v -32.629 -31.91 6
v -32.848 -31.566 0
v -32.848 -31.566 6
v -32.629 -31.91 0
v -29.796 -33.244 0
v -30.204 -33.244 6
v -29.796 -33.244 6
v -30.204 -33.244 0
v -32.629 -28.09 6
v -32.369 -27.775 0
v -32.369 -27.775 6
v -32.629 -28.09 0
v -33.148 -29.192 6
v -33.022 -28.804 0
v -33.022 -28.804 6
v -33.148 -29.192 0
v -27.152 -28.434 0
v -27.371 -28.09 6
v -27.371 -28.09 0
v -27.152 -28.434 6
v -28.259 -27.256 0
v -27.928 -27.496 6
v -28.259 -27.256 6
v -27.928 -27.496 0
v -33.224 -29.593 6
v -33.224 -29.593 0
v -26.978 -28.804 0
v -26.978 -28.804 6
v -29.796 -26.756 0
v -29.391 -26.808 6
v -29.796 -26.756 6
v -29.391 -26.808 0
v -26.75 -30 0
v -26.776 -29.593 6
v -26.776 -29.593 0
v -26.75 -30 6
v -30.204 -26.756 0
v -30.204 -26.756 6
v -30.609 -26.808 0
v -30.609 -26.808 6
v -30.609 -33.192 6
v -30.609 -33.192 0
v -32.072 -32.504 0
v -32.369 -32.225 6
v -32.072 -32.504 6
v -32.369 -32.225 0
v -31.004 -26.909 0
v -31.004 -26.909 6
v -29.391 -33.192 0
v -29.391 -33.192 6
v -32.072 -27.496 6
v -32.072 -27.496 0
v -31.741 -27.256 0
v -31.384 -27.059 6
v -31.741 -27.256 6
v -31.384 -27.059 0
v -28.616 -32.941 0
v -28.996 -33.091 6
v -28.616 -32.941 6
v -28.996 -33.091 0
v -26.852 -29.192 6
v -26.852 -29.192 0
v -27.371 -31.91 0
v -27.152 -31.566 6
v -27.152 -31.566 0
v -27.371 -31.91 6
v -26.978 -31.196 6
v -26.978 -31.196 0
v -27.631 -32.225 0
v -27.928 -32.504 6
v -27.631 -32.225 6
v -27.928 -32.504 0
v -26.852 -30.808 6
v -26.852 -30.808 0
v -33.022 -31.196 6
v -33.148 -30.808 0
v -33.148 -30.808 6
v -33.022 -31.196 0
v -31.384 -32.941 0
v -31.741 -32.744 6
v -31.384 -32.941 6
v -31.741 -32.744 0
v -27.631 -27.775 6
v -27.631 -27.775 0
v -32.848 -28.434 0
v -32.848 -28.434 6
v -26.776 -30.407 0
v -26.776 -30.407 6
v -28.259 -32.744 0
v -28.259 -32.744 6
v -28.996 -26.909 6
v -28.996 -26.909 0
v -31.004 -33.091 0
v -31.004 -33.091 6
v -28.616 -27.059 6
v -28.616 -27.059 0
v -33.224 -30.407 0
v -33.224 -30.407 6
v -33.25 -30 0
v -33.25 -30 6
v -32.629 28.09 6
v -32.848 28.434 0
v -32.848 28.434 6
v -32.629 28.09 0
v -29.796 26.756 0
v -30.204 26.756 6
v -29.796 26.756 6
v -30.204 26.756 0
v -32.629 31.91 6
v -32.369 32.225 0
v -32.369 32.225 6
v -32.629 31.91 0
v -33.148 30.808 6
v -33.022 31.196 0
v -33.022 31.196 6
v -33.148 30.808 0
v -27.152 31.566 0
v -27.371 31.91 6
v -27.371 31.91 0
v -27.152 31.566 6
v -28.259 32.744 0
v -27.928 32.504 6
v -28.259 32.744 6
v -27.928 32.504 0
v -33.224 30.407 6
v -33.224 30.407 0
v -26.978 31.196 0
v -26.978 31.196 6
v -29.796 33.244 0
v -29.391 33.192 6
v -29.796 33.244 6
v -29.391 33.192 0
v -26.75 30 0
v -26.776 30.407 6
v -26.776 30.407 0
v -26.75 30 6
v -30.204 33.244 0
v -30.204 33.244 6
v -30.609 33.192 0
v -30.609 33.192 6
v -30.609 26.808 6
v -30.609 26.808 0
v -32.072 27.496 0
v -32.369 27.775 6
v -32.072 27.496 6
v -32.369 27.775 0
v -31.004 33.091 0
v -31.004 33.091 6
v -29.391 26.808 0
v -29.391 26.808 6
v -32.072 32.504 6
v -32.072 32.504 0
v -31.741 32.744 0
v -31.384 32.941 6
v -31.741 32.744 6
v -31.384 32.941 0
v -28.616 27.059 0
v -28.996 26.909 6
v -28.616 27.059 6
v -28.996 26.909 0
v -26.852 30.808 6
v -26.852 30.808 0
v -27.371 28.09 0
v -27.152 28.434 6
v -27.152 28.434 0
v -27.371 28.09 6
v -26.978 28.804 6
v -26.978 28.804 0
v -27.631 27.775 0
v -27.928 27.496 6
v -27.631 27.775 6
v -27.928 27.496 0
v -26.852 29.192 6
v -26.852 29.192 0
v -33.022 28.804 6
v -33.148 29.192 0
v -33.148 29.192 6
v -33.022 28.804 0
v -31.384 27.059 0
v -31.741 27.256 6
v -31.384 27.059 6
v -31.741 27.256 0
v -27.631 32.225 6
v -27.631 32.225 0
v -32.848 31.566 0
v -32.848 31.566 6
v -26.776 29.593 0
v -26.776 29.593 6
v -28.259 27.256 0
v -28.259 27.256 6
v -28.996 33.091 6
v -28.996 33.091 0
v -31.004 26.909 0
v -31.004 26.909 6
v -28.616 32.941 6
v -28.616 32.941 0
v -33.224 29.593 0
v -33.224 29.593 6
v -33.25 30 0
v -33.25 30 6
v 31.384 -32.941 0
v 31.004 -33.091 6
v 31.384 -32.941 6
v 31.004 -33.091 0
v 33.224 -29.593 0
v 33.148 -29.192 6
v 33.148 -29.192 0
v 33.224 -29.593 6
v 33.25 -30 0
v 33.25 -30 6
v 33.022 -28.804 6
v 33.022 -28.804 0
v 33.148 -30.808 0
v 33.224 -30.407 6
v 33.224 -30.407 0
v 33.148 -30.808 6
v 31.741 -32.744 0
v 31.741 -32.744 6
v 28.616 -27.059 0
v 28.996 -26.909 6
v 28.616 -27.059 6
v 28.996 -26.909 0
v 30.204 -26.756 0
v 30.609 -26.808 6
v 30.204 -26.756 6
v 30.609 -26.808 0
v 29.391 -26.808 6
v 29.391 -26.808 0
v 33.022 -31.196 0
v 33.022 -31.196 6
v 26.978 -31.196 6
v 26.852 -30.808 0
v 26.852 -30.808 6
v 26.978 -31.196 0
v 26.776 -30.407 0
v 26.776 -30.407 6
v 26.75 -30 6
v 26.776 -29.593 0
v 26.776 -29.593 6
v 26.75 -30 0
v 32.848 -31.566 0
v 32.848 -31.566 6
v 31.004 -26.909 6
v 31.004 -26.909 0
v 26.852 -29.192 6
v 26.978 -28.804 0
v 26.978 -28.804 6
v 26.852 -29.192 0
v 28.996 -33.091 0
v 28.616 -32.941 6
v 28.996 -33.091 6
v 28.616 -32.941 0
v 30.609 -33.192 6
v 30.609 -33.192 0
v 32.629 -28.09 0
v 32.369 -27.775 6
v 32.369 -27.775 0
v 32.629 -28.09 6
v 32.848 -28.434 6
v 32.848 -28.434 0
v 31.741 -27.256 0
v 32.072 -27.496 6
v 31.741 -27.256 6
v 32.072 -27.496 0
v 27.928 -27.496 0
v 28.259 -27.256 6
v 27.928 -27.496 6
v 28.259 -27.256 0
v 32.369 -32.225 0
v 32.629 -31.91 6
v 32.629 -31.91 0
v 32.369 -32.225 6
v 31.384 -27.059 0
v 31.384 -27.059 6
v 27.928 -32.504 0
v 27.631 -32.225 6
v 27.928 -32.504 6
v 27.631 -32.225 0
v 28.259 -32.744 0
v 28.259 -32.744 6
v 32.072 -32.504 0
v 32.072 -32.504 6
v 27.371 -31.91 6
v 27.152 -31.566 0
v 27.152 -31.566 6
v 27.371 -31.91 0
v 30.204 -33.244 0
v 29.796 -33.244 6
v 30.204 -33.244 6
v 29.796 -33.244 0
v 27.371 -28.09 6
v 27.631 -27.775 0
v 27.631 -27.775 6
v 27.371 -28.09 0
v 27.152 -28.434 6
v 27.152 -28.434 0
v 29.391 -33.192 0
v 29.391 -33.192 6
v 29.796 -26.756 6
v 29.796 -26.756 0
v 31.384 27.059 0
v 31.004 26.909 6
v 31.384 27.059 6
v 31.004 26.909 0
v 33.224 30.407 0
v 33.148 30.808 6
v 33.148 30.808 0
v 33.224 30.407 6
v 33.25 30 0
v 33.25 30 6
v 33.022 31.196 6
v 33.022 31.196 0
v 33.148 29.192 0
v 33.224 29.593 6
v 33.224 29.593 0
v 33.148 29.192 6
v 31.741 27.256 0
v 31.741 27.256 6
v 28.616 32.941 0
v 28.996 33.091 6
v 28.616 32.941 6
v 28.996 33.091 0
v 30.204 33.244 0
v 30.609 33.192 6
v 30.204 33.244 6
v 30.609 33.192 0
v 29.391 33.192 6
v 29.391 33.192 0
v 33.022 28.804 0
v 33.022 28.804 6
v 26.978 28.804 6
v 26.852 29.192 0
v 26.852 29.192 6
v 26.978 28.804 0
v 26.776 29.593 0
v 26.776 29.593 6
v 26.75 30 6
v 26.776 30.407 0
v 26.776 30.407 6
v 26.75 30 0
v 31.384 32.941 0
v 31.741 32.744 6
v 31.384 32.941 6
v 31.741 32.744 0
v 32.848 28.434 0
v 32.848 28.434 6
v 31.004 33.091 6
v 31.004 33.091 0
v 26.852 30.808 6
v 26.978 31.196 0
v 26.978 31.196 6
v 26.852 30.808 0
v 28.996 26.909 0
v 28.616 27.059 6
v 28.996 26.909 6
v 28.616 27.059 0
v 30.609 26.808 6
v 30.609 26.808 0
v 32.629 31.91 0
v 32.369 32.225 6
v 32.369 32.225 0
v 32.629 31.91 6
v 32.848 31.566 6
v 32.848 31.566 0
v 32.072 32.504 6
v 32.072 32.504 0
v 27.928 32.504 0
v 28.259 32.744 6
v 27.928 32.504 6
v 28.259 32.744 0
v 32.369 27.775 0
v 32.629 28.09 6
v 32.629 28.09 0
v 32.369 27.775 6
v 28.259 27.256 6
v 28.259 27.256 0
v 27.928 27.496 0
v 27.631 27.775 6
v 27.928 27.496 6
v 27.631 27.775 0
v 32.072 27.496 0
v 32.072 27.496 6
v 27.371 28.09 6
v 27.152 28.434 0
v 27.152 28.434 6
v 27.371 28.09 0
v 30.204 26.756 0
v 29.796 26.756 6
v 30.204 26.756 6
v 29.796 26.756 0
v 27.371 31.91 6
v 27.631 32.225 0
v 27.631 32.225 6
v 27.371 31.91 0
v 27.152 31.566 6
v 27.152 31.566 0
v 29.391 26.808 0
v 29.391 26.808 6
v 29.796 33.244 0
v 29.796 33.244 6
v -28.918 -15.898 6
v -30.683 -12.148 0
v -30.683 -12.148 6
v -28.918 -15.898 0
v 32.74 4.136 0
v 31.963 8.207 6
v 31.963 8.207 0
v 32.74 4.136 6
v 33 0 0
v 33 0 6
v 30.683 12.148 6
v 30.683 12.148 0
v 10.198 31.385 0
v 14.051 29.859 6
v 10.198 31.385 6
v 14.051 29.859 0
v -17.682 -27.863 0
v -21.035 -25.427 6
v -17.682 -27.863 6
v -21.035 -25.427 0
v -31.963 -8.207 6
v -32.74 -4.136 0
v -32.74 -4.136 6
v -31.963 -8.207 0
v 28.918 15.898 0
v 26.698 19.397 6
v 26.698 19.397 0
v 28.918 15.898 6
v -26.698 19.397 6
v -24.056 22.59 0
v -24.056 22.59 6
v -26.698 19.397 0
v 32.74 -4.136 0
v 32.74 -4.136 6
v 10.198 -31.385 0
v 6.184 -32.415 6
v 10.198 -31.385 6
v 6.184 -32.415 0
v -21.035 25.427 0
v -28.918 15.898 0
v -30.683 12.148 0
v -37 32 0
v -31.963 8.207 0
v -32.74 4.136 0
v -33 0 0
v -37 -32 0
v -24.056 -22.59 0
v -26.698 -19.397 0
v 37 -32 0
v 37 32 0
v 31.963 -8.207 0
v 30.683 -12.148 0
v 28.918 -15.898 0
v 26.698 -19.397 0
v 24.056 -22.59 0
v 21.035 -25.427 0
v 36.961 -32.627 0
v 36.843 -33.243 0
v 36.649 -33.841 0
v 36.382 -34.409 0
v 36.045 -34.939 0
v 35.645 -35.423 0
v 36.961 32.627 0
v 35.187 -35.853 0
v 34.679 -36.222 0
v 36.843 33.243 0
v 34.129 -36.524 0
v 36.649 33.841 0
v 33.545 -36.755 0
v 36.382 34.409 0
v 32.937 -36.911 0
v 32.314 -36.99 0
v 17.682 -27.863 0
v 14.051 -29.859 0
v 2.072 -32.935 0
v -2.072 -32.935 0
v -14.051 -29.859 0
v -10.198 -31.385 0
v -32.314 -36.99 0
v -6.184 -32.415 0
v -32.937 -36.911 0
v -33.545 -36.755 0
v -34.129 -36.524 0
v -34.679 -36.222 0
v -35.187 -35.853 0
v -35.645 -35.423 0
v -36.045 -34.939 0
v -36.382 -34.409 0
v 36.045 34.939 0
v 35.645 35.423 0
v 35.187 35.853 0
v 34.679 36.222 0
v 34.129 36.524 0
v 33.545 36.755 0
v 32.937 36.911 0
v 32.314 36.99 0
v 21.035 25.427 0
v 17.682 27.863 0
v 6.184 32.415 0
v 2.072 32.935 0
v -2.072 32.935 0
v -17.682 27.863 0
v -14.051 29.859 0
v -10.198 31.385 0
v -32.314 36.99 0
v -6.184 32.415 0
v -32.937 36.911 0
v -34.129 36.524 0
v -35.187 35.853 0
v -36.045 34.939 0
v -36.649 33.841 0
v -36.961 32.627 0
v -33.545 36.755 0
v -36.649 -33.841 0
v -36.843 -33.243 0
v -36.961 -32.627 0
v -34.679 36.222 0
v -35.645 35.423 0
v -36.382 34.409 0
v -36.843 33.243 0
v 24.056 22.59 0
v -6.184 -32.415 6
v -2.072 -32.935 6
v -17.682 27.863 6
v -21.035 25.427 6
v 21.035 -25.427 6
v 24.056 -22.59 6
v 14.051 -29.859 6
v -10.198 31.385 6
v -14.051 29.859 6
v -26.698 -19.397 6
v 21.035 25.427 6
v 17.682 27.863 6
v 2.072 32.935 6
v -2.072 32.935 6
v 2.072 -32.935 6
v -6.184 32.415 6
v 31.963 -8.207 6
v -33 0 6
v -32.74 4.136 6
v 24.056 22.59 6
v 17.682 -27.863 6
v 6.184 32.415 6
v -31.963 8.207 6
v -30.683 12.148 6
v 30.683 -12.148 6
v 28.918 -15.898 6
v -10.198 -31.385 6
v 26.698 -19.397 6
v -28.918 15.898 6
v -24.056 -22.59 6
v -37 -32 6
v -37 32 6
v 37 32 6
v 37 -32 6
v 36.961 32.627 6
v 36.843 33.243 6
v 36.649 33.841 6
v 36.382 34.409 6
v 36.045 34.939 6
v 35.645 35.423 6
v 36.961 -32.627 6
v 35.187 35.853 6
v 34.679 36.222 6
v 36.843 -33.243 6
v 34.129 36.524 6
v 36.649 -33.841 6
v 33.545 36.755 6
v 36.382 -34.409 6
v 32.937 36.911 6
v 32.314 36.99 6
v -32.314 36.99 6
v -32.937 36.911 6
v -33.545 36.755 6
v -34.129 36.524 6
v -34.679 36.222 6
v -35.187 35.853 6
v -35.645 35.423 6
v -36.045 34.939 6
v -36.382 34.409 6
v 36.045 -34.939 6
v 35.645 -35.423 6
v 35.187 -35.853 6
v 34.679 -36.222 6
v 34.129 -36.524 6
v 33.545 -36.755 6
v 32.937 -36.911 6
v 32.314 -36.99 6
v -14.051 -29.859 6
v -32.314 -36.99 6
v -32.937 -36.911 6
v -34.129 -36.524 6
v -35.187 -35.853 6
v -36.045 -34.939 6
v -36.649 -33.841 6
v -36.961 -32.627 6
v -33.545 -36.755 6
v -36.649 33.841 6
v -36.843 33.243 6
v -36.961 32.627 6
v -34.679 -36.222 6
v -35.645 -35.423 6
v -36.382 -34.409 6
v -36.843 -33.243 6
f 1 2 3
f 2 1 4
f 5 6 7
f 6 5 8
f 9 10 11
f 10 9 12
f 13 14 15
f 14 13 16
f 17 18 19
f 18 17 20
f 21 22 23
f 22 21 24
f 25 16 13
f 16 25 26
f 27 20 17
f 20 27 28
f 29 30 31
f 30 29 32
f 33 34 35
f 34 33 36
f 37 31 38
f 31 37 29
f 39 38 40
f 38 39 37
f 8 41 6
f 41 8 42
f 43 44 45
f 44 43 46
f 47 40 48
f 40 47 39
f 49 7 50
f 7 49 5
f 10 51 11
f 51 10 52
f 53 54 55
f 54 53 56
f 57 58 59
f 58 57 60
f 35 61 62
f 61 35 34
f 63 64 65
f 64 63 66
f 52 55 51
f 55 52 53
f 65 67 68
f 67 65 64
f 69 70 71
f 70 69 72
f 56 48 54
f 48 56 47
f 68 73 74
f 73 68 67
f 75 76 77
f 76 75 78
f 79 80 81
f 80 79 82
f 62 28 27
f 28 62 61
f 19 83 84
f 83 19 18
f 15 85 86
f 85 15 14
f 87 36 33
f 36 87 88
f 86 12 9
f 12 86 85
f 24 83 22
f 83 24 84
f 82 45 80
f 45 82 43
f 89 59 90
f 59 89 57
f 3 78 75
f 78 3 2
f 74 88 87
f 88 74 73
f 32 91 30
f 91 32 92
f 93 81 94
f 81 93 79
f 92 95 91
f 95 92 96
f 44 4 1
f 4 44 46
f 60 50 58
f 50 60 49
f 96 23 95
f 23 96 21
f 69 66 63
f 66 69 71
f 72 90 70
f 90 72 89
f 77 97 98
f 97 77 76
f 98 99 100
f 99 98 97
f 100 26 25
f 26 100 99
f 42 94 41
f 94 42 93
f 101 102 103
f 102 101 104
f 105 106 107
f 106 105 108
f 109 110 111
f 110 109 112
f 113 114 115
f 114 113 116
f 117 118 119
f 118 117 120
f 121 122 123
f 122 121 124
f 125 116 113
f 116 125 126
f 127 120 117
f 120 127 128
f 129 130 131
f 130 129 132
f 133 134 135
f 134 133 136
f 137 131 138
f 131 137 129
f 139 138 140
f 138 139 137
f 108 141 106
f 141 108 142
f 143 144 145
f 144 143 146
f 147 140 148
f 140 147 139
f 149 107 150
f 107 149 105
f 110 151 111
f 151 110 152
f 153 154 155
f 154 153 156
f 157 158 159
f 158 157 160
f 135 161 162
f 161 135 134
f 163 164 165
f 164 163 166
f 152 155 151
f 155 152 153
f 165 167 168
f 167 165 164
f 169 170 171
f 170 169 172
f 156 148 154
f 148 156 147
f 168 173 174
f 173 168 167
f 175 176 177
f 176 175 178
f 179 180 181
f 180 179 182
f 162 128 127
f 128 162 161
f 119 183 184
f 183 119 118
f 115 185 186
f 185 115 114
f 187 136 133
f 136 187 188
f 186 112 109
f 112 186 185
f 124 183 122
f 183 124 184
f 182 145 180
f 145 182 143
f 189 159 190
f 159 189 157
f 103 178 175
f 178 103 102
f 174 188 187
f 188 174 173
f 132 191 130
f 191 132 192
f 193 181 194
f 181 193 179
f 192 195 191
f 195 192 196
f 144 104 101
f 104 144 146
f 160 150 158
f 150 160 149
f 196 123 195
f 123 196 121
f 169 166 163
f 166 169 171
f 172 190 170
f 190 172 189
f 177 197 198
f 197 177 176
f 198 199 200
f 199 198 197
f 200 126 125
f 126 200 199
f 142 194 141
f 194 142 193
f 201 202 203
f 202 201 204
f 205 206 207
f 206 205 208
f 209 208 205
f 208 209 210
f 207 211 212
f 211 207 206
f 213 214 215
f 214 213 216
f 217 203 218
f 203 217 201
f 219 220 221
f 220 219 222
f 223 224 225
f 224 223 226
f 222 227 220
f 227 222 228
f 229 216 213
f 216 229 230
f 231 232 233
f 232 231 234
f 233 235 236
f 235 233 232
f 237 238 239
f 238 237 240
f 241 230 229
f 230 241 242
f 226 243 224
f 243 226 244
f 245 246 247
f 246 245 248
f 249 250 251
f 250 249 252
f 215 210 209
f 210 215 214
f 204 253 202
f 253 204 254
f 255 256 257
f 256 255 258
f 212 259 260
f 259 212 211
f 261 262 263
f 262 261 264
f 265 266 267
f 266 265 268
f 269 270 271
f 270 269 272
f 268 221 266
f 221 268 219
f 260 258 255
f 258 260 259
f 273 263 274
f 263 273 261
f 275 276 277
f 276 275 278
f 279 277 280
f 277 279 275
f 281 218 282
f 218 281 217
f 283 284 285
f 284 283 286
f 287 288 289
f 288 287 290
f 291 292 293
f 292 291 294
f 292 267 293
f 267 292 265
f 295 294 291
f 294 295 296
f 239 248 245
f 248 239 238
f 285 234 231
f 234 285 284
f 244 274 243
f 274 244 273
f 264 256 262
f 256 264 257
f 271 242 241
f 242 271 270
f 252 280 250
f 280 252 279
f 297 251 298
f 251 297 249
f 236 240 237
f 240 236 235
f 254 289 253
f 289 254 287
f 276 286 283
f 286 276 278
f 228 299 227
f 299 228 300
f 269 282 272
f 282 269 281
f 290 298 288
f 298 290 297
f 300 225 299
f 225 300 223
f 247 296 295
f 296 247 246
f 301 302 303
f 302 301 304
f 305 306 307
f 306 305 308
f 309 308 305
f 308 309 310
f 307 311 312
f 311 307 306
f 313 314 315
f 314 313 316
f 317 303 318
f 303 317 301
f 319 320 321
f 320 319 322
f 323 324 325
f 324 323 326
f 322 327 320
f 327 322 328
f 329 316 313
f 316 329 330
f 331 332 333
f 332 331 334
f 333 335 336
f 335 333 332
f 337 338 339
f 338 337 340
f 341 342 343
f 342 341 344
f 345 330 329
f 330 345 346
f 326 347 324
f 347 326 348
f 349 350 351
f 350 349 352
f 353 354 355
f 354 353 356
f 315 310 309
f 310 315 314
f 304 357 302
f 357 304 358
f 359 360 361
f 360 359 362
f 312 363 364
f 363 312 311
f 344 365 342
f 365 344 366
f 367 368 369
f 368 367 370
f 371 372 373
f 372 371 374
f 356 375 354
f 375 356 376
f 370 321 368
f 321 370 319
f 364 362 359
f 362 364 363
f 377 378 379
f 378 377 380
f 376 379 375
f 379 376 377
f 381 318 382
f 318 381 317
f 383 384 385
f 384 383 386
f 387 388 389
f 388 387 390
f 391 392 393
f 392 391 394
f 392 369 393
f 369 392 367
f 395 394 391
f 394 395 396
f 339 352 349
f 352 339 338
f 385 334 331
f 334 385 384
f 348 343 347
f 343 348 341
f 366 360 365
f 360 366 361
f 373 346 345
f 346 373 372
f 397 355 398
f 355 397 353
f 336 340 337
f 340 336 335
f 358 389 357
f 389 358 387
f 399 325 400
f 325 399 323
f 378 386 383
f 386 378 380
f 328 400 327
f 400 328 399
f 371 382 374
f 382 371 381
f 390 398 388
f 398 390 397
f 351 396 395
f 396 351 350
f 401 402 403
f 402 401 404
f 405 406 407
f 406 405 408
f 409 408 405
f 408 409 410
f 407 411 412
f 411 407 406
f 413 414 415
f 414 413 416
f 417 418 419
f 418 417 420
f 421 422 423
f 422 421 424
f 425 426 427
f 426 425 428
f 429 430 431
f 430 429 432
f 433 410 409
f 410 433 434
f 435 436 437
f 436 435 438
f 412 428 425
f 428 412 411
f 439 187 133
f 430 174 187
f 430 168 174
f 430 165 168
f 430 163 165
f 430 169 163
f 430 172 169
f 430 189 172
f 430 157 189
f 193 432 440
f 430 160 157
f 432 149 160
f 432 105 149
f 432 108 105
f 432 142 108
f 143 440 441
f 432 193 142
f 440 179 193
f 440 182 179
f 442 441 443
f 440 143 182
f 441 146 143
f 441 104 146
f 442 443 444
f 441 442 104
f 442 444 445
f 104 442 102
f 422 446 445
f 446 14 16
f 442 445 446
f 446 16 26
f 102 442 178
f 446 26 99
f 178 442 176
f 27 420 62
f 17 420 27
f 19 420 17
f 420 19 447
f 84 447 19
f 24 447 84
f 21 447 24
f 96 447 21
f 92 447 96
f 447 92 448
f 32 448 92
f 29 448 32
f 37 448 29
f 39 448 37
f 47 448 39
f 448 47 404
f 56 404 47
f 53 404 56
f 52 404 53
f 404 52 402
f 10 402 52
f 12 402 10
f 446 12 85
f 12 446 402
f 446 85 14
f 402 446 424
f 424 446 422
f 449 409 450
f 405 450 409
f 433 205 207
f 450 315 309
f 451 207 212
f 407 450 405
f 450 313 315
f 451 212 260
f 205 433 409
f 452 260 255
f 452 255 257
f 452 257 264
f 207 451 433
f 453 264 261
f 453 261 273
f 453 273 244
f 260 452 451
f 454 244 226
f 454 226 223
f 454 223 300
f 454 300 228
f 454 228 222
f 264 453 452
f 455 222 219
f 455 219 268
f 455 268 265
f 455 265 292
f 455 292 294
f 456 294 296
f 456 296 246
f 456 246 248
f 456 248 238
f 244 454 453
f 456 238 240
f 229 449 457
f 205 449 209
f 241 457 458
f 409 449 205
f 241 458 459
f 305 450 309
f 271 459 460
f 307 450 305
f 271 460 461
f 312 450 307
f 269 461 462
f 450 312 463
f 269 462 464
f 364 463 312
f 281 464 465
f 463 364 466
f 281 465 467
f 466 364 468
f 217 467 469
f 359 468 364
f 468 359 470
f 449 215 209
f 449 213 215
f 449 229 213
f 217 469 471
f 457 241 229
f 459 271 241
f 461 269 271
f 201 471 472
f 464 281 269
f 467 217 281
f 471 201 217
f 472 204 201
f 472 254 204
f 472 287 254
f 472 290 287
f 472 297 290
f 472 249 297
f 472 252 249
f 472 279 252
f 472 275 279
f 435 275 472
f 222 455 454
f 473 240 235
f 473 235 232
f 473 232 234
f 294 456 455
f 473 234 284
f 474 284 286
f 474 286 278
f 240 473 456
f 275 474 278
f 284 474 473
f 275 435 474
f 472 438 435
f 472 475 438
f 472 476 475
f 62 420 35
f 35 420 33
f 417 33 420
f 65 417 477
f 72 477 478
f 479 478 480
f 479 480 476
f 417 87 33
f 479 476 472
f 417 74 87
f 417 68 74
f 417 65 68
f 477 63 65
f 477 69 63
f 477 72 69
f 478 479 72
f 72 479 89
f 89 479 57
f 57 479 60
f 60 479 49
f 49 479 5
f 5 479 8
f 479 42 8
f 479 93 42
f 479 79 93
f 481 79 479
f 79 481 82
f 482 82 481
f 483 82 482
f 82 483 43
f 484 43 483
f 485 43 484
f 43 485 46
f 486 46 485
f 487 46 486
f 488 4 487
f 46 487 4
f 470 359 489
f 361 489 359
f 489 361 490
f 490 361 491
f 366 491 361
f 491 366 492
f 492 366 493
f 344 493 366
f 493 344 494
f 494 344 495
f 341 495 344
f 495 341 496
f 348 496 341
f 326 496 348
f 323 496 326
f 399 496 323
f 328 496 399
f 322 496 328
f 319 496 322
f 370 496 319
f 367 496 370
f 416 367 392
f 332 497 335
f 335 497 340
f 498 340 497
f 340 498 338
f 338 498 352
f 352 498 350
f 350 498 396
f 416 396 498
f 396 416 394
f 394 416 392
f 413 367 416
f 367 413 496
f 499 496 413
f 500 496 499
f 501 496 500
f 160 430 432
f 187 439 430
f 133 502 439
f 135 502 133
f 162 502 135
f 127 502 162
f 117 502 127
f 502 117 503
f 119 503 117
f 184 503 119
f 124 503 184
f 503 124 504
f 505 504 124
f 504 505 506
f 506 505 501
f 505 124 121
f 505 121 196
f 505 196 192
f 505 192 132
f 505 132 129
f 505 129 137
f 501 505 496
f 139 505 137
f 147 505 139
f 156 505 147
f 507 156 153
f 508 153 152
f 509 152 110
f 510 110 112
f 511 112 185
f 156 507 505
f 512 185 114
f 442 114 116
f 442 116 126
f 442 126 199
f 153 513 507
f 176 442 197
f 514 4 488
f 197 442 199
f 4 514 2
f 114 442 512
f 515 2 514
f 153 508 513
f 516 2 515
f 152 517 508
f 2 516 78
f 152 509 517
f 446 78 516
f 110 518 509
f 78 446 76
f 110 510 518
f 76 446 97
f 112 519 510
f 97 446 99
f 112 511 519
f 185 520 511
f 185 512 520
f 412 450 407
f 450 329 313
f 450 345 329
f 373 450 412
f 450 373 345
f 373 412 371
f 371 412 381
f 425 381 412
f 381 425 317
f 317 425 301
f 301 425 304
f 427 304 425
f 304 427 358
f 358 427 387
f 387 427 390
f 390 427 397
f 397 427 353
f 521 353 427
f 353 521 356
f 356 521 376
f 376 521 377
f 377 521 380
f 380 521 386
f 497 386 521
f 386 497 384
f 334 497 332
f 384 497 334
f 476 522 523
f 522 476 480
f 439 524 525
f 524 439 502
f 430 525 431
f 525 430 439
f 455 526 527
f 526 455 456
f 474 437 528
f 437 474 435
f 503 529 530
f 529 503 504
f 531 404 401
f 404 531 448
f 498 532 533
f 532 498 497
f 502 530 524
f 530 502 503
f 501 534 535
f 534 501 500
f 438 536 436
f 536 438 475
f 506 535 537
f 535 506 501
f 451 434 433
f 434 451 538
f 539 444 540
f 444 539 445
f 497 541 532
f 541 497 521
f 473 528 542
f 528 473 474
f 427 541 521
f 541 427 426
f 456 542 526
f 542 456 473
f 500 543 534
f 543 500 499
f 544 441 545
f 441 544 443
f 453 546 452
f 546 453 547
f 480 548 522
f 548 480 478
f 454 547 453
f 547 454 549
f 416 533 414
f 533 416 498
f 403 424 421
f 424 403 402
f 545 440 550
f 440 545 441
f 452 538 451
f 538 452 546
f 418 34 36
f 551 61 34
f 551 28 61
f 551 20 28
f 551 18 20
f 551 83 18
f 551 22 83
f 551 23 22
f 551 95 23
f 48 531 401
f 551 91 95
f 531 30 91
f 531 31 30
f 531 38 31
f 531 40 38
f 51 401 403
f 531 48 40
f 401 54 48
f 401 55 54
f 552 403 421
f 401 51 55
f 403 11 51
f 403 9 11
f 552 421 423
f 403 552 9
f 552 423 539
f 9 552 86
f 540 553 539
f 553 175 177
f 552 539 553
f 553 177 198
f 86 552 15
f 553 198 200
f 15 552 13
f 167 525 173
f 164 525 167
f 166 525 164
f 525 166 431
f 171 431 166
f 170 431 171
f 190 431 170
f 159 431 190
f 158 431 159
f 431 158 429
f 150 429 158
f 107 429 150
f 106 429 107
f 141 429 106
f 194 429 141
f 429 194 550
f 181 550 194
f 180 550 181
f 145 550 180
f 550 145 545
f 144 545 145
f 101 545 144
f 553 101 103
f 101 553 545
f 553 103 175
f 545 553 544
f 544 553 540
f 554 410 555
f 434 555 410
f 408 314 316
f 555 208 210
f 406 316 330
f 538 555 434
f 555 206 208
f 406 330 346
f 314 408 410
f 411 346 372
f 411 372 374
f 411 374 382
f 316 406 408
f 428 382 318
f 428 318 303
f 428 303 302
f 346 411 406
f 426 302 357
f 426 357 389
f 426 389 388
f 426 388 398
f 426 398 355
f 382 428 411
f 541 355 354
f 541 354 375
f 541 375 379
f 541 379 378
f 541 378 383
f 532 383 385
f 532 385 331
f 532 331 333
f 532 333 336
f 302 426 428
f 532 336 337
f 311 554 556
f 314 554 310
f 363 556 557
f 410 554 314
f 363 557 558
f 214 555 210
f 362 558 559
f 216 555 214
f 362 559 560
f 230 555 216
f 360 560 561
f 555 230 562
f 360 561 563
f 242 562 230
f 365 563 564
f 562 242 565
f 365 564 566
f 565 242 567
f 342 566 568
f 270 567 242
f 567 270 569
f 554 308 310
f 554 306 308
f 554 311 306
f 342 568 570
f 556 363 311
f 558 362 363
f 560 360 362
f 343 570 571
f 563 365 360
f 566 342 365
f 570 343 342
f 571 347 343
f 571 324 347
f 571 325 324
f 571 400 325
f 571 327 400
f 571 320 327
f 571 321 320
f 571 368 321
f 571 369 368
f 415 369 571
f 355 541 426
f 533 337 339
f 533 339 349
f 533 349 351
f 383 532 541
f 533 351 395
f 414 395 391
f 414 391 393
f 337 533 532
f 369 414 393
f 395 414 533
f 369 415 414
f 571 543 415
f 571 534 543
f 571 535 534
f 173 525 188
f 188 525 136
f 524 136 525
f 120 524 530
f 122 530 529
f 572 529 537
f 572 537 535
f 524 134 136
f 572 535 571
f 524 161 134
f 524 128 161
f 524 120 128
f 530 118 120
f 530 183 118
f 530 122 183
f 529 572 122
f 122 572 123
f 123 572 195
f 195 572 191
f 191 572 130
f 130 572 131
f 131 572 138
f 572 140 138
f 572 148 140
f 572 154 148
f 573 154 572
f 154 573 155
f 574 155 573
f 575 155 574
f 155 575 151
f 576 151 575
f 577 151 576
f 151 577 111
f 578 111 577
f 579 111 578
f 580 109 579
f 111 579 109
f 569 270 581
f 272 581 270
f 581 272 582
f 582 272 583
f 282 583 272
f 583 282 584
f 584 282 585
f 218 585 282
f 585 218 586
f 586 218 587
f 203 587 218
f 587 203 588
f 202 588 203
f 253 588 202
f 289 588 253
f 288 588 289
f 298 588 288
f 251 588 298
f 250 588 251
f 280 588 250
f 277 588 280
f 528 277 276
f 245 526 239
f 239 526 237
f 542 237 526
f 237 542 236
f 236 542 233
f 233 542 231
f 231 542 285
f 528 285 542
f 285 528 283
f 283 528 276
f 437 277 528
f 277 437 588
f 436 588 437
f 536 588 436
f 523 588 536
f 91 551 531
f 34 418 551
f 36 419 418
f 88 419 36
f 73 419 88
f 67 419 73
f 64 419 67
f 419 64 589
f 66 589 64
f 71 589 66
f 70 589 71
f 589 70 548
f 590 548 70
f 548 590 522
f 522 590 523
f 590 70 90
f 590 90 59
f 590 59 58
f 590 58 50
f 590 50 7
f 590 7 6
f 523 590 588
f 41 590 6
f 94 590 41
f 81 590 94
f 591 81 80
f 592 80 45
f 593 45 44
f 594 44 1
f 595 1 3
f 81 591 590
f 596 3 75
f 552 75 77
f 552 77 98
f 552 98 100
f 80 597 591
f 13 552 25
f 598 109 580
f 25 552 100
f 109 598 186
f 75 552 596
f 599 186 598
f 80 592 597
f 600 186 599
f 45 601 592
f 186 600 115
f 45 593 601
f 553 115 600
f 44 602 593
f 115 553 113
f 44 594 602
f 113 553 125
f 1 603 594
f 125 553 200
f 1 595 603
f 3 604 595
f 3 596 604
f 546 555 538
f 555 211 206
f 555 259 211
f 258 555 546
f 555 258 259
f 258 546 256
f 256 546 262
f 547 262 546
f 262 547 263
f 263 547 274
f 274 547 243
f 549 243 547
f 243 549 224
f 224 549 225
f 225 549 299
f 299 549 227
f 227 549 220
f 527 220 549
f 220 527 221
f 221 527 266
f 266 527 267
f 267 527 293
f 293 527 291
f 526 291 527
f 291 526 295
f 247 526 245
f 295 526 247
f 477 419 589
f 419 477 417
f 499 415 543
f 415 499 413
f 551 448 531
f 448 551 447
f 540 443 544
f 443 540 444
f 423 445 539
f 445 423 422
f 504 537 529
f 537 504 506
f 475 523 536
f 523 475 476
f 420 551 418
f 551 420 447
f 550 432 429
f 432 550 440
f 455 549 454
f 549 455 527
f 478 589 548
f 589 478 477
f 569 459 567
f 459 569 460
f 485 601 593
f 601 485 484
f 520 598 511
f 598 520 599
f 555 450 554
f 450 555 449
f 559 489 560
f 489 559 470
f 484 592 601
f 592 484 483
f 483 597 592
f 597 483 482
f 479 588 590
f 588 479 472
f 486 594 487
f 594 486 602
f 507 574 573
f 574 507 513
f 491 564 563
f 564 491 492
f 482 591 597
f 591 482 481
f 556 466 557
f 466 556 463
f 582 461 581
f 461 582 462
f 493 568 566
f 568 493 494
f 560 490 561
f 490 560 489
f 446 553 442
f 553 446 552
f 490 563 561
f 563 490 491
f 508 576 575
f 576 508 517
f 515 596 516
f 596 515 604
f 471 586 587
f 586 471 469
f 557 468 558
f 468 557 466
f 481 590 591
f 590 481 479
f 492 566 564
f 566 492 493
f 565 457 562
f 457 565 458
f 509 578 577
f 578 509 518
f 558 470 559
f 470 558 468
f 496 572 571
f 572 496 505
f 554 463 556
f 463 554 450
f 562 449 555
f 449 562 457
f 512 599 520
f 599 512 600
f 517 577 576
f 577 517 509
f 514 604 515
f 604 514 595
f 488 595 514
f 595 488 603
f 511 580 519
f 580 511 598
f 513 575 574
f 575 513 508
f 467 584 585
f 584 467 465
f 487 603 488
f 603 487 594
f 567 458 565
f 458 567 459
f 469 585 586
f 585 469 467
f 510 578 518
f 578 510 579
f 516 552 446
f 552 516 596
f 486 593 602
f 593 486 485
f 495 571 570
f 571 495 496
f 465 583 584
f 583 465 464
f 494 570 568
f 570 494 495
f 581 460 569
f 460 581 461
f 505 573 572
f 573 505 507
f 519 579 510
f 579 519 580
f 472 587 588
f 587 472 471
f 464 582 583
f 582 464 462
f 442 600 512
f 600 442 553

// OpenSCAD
$fn = 50;


difference() {
	union() {
		hull() {
			translate(v = [-32.0000000000, 32.0000000000, 0]) {
				cylinder(h = 6, r = 5);
			}
			translate(v = [32.0000000000, 32.0000000000, 0]) {
				cylinder(h = 6, r = 5);
			}
			translate(v = [-32.0000000000, -32.0000000000, 0]) {
				cylinder(h = 6, r = 5);
			}
			translate(v = [32.0000000000, -32.0000000000, 0]) {
				cylinder(h = 6, r = 5);
			}
		}
	}
	union() {
		#translate(v = [-30.0000000000, -30.0000000000, -100.0000000000]) {
			cylinder(h = 200, r = 3.2500000000);
		}
		#translate(v = [-30.0000000000, 30.0000000000, -100.0000000000]) {
			cylinder(h = 200, r = 3.2500000000);
		}
		#translate(v = [30.0000000000, -30.0000000000, -100.0000000000]) {
			cylinder(h = 200, r = 3.2500000000);
		}
		#translate(v = [30.0000000000, 30.0000000000, -100.0000000000]) {
			cylinder(h = 200, r = 3.2500000000);
		}
		#cylinder(h = 6, r = 33.0000000000);
	}
}
